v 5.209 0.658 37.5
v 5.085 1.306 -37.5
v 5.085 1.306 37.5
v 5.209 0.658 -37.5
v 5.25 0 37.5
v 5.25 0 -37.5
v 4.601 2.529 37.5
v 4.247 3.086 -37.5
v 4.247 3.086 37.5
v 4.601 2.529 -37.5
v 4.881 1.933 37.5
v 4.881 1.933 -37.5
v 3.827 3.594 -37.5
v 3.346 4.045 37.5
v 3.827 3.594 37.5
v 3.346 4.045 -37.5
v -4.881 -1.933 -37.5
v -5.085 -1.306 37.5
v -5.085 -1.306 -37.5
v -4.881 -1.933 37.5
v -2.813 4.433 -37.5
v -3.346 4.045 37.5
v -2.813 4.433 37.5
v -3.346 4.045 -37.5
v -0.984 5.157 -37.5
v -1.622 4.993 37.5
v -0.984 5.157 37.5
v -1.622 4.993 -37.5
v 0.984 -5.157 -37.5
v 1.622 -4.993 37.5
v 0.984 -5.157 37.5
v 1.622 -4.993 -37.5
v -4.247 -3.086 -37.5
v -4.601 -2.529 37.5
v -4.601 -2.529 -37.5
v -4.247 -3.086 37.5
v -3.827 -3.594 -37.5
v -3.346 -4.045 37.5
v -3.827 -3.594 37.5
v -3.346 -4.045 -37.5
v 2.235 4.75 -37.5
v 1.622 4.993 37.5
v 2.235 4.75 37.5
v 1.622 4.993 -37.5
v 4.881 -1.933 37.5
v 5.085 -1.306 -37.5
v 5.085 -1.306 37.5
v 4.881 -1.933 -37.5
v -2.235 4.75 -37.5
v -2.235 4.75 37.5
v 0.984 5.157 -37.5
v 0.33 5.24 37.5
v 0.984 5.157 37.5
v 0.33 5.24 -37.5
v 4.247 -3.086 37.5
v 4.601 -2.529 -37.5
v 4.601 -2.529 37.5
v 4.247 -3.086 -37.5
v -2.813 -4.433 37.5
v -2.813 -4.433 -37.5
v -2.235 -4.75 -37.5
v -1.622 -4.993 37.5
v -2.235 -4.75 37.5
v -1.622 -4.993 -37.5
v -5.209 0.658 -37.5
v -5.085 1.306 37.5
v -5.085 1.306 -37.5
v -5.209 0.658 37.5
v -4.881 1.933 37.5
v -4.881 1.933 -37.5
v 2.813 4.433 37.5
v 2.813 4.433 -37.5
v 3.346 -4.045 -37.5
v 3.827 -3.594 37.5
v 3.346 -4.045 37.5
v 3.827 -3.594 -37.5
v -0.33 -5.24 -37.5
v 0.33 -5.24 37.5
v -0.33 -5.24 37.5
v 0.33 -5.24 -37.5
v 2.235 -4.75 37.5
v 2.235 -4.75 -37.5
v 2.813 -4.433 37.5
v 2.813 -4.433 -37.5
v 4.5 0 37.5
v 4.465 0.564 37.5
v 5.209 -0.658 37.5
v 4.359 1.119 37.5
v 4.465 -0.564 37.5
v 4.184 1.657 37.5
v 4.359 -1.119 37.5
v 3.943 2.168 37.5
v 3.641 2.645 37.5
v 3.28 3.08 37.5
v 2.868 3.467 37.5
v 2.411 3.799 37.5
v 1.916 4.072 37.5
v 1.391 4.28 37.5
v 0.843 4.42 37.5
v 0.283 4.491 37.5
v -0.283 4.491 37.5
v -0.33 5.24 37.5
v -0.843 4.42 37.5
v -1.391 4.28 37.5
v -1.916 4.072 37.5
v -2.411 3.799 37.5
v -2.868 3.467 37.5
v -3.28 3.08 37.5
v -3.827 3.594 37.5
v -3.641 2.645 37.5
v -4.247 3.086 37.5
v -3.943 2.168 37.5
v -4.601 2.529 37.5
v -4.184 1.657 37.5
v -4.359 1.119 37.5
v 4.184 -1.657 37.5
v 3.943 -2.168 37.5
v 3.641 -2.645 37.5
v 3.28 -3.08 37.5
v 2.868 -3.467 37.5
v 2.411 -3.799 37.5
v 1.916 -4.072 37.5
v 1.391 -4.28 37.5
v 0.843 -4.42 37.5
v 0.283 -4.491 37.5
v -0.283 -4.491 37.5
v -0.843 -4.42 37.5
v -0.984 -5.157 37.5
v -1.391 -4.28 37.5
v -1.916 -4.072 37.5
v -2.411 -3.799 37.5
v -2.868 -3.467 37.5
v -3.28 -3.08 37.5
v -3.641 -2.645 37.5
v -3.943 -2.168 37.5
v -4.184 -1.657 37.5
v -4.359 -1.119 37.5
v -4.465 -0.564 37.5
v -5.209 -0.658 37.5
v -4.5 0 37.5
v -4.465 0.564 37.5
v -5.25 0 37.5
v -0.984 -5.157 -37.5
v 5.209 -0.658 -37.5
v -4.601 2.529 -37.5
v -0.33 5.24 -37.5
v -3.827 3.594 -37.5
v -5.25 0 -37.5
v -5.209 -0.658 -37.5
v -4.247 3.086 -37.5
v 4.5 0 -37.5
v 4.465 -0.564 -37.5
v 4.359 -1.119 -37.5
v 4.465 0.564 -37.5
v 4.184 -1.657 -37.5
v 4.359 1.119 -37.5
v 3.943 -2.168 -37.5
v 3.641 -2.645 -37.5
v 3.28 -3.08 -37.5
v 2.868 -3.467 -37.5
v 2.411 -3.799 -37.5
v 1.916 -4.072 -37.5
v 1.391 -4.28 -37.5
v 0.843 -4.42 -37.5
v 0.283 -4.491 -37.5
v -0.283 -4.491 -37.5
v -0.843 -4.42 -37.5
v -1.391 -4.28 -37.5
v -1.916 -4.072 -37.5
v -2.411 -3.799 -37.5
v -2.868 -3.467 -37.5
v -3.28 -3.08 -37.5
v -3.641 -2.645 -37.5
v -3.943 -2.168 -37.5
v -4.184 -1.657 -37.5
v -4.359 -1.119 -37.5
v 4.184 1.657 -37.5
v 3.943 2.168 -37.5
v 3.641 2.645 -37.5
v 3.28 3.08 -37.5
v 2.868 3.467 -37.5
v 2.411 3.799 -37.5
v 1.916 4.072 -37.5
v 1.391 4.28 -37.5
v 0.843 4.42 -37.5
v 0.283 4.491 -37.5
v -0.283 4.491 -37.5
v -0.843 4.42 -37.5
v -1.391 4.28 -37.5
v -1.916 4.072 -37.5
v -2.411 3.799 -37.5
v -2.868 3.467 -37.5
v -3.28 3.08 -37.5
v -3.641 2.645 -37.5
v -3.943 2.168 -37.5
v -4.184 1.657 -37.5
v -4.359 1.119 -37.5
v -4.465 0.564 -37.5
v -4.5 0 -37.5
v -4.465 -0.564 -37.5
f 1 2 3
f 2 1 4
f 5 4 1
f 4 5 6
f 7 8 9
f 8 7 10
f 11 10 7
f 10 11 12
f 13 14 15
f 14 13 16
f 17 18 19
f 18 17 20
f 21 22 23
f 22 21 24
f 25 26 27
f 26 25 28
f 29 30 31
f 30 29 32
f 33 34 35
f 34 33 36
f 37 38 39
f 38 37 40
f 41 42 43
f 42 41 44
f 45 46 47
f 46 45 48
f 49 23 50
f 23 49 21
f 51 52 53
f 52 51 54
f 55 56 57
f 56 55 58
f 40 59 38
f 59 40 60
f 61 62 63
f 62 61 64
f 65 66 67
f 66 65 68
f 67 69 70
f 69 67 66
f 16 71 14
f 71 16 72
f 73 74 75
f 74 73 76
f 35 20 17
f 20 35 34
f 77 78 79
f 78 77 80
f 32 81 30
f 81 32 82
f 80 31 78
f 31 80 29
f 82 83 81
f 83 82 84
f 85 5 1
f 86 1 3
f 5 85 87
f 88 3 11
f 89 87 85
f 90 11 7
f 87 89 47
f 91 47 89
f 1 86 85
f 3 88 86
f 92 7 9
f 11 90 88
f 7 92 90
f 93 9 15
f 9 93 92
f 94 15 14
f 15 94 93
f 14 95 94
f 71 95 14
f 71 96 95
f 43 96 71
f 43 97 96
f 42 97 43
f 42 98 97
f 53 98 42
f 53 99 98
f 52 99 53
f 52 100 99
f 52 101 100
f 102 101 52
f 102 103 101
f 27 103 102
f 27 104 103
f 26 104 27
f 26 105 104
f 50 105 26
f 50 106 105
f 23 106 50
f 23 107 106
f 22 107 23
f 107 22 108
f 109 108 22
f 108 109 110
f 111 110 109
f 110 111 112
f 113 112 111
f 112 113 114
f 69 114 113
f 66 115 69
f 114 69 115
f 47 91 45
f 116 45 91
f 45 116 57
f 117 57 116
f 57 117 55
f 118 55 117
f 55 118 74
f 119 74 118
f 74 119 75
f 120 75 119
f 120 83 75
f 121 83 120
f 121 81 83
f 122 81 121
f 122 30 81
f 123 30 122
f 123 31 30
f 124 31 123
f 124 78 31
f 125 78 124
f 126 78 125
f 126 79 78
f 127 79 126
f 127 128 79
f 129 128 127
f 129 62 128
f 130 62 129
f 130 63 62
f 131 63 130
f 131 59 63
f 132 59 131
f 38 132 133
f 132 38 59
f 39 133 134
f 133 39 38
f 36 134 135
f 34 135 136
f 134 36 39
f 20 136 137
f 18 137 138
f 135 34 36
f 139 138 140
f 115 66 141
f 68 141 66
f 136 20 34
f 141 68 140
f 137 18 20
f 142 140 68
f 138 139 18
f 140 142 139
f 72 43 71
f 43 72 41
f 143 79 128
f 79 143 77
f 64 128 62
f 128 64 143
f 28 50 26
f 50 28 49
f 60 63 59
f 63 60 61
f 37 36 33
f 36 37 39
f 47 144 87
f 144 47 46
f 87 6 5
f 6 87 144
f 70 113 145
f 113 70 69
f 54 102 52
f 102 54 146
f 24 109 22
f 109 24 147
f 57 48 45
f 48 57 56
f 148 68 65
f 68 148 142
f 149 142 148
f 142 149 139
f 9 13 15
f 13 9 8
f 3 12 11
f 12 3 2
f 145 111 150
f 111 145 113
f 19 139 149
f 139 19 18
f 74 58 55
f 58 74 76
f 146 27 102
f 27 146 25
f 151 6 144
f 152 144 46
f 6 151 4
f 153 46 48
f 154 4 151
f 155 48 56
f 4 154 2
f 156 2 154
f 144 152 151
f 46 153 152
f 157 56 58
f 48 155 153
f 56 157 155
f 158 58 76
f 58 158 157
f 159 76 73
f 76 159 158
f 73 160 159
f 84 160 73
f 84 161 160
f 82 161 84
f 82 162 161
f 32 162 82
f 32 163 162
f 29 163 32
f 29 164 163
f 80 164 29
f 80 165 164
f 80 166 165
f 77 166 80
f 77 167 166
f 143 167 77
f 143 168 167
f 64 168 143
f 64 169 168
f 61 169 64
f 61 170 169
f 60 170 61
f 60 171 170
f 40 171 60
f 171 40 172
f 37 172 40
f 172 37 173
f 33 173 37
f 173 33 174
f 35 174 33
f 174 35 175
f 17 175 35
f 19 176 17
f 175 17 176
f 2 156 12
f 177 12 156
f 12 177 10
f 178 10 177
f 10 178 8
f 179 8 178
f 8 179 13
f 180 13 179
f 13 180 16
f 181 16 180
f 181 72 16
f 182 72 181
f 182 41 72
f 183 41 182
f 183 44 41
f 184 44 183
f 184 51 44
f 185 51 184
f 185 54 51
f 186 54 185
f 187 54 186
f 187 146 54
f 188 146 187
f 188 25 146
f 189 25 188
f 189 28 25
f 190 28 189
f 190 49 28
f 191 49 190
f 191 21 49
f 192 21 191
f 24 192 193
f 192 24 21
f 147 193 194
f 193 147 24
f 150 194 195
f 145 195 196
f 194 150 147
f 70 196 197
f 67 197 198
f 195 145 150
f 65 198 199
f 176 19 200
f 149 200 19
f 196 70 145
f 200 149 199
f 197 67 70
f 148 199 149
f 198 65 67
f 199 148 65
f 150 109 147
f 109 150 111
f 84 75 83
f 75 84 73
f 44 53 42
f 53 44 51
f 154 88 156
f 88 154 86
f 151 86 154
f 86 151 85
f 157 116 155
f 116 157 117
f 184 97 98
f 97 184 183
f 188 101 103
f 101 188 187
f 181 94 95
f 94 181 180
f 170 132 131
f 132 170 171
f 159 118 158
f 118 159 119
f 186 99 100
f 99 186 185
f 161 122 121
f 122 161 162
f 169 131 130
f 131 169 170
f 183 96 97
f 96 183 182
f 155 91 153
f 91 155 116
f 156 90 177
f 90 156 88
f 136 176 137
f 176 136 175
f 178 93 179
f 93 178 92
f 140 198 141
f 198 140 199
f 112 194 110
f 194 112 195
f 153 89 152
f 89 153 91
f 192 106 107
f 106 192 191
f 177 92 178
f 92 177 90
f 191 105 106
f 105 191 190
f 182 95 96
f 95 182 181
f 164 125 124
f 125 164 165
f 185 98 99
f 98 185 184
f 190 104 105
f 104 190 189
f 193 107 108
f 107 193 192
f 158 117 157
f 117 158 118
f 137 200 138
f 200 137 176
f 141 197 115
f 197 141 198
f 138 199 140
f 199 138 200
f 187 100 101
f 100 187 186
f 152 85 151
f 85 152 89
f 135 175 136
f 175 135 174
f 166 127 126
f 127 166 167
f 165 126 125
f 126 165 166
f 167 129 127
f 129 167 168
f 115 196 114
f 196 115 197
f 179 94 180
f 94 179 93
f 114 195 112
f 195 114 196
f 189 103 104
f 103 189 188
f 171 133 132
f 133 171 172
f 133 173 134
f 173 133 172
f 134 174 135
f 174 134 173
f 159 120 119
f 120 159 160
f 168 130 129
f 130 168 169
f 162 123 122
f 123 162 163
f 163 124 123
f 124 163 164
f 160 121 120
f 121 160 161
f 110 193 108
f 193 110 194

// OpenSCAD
$fn = 50;


difference() {
	union() {
		translate(v = [0, 0, -37.5000000000]) {
			cylinder(h = 75, r = 5.2500000000);
		}
	}
	union() {
		translate(v = [0, 0, -100.0000000000]) {
			cylinder(h = 200, r = 4.5000000000);
		}
	}
}
